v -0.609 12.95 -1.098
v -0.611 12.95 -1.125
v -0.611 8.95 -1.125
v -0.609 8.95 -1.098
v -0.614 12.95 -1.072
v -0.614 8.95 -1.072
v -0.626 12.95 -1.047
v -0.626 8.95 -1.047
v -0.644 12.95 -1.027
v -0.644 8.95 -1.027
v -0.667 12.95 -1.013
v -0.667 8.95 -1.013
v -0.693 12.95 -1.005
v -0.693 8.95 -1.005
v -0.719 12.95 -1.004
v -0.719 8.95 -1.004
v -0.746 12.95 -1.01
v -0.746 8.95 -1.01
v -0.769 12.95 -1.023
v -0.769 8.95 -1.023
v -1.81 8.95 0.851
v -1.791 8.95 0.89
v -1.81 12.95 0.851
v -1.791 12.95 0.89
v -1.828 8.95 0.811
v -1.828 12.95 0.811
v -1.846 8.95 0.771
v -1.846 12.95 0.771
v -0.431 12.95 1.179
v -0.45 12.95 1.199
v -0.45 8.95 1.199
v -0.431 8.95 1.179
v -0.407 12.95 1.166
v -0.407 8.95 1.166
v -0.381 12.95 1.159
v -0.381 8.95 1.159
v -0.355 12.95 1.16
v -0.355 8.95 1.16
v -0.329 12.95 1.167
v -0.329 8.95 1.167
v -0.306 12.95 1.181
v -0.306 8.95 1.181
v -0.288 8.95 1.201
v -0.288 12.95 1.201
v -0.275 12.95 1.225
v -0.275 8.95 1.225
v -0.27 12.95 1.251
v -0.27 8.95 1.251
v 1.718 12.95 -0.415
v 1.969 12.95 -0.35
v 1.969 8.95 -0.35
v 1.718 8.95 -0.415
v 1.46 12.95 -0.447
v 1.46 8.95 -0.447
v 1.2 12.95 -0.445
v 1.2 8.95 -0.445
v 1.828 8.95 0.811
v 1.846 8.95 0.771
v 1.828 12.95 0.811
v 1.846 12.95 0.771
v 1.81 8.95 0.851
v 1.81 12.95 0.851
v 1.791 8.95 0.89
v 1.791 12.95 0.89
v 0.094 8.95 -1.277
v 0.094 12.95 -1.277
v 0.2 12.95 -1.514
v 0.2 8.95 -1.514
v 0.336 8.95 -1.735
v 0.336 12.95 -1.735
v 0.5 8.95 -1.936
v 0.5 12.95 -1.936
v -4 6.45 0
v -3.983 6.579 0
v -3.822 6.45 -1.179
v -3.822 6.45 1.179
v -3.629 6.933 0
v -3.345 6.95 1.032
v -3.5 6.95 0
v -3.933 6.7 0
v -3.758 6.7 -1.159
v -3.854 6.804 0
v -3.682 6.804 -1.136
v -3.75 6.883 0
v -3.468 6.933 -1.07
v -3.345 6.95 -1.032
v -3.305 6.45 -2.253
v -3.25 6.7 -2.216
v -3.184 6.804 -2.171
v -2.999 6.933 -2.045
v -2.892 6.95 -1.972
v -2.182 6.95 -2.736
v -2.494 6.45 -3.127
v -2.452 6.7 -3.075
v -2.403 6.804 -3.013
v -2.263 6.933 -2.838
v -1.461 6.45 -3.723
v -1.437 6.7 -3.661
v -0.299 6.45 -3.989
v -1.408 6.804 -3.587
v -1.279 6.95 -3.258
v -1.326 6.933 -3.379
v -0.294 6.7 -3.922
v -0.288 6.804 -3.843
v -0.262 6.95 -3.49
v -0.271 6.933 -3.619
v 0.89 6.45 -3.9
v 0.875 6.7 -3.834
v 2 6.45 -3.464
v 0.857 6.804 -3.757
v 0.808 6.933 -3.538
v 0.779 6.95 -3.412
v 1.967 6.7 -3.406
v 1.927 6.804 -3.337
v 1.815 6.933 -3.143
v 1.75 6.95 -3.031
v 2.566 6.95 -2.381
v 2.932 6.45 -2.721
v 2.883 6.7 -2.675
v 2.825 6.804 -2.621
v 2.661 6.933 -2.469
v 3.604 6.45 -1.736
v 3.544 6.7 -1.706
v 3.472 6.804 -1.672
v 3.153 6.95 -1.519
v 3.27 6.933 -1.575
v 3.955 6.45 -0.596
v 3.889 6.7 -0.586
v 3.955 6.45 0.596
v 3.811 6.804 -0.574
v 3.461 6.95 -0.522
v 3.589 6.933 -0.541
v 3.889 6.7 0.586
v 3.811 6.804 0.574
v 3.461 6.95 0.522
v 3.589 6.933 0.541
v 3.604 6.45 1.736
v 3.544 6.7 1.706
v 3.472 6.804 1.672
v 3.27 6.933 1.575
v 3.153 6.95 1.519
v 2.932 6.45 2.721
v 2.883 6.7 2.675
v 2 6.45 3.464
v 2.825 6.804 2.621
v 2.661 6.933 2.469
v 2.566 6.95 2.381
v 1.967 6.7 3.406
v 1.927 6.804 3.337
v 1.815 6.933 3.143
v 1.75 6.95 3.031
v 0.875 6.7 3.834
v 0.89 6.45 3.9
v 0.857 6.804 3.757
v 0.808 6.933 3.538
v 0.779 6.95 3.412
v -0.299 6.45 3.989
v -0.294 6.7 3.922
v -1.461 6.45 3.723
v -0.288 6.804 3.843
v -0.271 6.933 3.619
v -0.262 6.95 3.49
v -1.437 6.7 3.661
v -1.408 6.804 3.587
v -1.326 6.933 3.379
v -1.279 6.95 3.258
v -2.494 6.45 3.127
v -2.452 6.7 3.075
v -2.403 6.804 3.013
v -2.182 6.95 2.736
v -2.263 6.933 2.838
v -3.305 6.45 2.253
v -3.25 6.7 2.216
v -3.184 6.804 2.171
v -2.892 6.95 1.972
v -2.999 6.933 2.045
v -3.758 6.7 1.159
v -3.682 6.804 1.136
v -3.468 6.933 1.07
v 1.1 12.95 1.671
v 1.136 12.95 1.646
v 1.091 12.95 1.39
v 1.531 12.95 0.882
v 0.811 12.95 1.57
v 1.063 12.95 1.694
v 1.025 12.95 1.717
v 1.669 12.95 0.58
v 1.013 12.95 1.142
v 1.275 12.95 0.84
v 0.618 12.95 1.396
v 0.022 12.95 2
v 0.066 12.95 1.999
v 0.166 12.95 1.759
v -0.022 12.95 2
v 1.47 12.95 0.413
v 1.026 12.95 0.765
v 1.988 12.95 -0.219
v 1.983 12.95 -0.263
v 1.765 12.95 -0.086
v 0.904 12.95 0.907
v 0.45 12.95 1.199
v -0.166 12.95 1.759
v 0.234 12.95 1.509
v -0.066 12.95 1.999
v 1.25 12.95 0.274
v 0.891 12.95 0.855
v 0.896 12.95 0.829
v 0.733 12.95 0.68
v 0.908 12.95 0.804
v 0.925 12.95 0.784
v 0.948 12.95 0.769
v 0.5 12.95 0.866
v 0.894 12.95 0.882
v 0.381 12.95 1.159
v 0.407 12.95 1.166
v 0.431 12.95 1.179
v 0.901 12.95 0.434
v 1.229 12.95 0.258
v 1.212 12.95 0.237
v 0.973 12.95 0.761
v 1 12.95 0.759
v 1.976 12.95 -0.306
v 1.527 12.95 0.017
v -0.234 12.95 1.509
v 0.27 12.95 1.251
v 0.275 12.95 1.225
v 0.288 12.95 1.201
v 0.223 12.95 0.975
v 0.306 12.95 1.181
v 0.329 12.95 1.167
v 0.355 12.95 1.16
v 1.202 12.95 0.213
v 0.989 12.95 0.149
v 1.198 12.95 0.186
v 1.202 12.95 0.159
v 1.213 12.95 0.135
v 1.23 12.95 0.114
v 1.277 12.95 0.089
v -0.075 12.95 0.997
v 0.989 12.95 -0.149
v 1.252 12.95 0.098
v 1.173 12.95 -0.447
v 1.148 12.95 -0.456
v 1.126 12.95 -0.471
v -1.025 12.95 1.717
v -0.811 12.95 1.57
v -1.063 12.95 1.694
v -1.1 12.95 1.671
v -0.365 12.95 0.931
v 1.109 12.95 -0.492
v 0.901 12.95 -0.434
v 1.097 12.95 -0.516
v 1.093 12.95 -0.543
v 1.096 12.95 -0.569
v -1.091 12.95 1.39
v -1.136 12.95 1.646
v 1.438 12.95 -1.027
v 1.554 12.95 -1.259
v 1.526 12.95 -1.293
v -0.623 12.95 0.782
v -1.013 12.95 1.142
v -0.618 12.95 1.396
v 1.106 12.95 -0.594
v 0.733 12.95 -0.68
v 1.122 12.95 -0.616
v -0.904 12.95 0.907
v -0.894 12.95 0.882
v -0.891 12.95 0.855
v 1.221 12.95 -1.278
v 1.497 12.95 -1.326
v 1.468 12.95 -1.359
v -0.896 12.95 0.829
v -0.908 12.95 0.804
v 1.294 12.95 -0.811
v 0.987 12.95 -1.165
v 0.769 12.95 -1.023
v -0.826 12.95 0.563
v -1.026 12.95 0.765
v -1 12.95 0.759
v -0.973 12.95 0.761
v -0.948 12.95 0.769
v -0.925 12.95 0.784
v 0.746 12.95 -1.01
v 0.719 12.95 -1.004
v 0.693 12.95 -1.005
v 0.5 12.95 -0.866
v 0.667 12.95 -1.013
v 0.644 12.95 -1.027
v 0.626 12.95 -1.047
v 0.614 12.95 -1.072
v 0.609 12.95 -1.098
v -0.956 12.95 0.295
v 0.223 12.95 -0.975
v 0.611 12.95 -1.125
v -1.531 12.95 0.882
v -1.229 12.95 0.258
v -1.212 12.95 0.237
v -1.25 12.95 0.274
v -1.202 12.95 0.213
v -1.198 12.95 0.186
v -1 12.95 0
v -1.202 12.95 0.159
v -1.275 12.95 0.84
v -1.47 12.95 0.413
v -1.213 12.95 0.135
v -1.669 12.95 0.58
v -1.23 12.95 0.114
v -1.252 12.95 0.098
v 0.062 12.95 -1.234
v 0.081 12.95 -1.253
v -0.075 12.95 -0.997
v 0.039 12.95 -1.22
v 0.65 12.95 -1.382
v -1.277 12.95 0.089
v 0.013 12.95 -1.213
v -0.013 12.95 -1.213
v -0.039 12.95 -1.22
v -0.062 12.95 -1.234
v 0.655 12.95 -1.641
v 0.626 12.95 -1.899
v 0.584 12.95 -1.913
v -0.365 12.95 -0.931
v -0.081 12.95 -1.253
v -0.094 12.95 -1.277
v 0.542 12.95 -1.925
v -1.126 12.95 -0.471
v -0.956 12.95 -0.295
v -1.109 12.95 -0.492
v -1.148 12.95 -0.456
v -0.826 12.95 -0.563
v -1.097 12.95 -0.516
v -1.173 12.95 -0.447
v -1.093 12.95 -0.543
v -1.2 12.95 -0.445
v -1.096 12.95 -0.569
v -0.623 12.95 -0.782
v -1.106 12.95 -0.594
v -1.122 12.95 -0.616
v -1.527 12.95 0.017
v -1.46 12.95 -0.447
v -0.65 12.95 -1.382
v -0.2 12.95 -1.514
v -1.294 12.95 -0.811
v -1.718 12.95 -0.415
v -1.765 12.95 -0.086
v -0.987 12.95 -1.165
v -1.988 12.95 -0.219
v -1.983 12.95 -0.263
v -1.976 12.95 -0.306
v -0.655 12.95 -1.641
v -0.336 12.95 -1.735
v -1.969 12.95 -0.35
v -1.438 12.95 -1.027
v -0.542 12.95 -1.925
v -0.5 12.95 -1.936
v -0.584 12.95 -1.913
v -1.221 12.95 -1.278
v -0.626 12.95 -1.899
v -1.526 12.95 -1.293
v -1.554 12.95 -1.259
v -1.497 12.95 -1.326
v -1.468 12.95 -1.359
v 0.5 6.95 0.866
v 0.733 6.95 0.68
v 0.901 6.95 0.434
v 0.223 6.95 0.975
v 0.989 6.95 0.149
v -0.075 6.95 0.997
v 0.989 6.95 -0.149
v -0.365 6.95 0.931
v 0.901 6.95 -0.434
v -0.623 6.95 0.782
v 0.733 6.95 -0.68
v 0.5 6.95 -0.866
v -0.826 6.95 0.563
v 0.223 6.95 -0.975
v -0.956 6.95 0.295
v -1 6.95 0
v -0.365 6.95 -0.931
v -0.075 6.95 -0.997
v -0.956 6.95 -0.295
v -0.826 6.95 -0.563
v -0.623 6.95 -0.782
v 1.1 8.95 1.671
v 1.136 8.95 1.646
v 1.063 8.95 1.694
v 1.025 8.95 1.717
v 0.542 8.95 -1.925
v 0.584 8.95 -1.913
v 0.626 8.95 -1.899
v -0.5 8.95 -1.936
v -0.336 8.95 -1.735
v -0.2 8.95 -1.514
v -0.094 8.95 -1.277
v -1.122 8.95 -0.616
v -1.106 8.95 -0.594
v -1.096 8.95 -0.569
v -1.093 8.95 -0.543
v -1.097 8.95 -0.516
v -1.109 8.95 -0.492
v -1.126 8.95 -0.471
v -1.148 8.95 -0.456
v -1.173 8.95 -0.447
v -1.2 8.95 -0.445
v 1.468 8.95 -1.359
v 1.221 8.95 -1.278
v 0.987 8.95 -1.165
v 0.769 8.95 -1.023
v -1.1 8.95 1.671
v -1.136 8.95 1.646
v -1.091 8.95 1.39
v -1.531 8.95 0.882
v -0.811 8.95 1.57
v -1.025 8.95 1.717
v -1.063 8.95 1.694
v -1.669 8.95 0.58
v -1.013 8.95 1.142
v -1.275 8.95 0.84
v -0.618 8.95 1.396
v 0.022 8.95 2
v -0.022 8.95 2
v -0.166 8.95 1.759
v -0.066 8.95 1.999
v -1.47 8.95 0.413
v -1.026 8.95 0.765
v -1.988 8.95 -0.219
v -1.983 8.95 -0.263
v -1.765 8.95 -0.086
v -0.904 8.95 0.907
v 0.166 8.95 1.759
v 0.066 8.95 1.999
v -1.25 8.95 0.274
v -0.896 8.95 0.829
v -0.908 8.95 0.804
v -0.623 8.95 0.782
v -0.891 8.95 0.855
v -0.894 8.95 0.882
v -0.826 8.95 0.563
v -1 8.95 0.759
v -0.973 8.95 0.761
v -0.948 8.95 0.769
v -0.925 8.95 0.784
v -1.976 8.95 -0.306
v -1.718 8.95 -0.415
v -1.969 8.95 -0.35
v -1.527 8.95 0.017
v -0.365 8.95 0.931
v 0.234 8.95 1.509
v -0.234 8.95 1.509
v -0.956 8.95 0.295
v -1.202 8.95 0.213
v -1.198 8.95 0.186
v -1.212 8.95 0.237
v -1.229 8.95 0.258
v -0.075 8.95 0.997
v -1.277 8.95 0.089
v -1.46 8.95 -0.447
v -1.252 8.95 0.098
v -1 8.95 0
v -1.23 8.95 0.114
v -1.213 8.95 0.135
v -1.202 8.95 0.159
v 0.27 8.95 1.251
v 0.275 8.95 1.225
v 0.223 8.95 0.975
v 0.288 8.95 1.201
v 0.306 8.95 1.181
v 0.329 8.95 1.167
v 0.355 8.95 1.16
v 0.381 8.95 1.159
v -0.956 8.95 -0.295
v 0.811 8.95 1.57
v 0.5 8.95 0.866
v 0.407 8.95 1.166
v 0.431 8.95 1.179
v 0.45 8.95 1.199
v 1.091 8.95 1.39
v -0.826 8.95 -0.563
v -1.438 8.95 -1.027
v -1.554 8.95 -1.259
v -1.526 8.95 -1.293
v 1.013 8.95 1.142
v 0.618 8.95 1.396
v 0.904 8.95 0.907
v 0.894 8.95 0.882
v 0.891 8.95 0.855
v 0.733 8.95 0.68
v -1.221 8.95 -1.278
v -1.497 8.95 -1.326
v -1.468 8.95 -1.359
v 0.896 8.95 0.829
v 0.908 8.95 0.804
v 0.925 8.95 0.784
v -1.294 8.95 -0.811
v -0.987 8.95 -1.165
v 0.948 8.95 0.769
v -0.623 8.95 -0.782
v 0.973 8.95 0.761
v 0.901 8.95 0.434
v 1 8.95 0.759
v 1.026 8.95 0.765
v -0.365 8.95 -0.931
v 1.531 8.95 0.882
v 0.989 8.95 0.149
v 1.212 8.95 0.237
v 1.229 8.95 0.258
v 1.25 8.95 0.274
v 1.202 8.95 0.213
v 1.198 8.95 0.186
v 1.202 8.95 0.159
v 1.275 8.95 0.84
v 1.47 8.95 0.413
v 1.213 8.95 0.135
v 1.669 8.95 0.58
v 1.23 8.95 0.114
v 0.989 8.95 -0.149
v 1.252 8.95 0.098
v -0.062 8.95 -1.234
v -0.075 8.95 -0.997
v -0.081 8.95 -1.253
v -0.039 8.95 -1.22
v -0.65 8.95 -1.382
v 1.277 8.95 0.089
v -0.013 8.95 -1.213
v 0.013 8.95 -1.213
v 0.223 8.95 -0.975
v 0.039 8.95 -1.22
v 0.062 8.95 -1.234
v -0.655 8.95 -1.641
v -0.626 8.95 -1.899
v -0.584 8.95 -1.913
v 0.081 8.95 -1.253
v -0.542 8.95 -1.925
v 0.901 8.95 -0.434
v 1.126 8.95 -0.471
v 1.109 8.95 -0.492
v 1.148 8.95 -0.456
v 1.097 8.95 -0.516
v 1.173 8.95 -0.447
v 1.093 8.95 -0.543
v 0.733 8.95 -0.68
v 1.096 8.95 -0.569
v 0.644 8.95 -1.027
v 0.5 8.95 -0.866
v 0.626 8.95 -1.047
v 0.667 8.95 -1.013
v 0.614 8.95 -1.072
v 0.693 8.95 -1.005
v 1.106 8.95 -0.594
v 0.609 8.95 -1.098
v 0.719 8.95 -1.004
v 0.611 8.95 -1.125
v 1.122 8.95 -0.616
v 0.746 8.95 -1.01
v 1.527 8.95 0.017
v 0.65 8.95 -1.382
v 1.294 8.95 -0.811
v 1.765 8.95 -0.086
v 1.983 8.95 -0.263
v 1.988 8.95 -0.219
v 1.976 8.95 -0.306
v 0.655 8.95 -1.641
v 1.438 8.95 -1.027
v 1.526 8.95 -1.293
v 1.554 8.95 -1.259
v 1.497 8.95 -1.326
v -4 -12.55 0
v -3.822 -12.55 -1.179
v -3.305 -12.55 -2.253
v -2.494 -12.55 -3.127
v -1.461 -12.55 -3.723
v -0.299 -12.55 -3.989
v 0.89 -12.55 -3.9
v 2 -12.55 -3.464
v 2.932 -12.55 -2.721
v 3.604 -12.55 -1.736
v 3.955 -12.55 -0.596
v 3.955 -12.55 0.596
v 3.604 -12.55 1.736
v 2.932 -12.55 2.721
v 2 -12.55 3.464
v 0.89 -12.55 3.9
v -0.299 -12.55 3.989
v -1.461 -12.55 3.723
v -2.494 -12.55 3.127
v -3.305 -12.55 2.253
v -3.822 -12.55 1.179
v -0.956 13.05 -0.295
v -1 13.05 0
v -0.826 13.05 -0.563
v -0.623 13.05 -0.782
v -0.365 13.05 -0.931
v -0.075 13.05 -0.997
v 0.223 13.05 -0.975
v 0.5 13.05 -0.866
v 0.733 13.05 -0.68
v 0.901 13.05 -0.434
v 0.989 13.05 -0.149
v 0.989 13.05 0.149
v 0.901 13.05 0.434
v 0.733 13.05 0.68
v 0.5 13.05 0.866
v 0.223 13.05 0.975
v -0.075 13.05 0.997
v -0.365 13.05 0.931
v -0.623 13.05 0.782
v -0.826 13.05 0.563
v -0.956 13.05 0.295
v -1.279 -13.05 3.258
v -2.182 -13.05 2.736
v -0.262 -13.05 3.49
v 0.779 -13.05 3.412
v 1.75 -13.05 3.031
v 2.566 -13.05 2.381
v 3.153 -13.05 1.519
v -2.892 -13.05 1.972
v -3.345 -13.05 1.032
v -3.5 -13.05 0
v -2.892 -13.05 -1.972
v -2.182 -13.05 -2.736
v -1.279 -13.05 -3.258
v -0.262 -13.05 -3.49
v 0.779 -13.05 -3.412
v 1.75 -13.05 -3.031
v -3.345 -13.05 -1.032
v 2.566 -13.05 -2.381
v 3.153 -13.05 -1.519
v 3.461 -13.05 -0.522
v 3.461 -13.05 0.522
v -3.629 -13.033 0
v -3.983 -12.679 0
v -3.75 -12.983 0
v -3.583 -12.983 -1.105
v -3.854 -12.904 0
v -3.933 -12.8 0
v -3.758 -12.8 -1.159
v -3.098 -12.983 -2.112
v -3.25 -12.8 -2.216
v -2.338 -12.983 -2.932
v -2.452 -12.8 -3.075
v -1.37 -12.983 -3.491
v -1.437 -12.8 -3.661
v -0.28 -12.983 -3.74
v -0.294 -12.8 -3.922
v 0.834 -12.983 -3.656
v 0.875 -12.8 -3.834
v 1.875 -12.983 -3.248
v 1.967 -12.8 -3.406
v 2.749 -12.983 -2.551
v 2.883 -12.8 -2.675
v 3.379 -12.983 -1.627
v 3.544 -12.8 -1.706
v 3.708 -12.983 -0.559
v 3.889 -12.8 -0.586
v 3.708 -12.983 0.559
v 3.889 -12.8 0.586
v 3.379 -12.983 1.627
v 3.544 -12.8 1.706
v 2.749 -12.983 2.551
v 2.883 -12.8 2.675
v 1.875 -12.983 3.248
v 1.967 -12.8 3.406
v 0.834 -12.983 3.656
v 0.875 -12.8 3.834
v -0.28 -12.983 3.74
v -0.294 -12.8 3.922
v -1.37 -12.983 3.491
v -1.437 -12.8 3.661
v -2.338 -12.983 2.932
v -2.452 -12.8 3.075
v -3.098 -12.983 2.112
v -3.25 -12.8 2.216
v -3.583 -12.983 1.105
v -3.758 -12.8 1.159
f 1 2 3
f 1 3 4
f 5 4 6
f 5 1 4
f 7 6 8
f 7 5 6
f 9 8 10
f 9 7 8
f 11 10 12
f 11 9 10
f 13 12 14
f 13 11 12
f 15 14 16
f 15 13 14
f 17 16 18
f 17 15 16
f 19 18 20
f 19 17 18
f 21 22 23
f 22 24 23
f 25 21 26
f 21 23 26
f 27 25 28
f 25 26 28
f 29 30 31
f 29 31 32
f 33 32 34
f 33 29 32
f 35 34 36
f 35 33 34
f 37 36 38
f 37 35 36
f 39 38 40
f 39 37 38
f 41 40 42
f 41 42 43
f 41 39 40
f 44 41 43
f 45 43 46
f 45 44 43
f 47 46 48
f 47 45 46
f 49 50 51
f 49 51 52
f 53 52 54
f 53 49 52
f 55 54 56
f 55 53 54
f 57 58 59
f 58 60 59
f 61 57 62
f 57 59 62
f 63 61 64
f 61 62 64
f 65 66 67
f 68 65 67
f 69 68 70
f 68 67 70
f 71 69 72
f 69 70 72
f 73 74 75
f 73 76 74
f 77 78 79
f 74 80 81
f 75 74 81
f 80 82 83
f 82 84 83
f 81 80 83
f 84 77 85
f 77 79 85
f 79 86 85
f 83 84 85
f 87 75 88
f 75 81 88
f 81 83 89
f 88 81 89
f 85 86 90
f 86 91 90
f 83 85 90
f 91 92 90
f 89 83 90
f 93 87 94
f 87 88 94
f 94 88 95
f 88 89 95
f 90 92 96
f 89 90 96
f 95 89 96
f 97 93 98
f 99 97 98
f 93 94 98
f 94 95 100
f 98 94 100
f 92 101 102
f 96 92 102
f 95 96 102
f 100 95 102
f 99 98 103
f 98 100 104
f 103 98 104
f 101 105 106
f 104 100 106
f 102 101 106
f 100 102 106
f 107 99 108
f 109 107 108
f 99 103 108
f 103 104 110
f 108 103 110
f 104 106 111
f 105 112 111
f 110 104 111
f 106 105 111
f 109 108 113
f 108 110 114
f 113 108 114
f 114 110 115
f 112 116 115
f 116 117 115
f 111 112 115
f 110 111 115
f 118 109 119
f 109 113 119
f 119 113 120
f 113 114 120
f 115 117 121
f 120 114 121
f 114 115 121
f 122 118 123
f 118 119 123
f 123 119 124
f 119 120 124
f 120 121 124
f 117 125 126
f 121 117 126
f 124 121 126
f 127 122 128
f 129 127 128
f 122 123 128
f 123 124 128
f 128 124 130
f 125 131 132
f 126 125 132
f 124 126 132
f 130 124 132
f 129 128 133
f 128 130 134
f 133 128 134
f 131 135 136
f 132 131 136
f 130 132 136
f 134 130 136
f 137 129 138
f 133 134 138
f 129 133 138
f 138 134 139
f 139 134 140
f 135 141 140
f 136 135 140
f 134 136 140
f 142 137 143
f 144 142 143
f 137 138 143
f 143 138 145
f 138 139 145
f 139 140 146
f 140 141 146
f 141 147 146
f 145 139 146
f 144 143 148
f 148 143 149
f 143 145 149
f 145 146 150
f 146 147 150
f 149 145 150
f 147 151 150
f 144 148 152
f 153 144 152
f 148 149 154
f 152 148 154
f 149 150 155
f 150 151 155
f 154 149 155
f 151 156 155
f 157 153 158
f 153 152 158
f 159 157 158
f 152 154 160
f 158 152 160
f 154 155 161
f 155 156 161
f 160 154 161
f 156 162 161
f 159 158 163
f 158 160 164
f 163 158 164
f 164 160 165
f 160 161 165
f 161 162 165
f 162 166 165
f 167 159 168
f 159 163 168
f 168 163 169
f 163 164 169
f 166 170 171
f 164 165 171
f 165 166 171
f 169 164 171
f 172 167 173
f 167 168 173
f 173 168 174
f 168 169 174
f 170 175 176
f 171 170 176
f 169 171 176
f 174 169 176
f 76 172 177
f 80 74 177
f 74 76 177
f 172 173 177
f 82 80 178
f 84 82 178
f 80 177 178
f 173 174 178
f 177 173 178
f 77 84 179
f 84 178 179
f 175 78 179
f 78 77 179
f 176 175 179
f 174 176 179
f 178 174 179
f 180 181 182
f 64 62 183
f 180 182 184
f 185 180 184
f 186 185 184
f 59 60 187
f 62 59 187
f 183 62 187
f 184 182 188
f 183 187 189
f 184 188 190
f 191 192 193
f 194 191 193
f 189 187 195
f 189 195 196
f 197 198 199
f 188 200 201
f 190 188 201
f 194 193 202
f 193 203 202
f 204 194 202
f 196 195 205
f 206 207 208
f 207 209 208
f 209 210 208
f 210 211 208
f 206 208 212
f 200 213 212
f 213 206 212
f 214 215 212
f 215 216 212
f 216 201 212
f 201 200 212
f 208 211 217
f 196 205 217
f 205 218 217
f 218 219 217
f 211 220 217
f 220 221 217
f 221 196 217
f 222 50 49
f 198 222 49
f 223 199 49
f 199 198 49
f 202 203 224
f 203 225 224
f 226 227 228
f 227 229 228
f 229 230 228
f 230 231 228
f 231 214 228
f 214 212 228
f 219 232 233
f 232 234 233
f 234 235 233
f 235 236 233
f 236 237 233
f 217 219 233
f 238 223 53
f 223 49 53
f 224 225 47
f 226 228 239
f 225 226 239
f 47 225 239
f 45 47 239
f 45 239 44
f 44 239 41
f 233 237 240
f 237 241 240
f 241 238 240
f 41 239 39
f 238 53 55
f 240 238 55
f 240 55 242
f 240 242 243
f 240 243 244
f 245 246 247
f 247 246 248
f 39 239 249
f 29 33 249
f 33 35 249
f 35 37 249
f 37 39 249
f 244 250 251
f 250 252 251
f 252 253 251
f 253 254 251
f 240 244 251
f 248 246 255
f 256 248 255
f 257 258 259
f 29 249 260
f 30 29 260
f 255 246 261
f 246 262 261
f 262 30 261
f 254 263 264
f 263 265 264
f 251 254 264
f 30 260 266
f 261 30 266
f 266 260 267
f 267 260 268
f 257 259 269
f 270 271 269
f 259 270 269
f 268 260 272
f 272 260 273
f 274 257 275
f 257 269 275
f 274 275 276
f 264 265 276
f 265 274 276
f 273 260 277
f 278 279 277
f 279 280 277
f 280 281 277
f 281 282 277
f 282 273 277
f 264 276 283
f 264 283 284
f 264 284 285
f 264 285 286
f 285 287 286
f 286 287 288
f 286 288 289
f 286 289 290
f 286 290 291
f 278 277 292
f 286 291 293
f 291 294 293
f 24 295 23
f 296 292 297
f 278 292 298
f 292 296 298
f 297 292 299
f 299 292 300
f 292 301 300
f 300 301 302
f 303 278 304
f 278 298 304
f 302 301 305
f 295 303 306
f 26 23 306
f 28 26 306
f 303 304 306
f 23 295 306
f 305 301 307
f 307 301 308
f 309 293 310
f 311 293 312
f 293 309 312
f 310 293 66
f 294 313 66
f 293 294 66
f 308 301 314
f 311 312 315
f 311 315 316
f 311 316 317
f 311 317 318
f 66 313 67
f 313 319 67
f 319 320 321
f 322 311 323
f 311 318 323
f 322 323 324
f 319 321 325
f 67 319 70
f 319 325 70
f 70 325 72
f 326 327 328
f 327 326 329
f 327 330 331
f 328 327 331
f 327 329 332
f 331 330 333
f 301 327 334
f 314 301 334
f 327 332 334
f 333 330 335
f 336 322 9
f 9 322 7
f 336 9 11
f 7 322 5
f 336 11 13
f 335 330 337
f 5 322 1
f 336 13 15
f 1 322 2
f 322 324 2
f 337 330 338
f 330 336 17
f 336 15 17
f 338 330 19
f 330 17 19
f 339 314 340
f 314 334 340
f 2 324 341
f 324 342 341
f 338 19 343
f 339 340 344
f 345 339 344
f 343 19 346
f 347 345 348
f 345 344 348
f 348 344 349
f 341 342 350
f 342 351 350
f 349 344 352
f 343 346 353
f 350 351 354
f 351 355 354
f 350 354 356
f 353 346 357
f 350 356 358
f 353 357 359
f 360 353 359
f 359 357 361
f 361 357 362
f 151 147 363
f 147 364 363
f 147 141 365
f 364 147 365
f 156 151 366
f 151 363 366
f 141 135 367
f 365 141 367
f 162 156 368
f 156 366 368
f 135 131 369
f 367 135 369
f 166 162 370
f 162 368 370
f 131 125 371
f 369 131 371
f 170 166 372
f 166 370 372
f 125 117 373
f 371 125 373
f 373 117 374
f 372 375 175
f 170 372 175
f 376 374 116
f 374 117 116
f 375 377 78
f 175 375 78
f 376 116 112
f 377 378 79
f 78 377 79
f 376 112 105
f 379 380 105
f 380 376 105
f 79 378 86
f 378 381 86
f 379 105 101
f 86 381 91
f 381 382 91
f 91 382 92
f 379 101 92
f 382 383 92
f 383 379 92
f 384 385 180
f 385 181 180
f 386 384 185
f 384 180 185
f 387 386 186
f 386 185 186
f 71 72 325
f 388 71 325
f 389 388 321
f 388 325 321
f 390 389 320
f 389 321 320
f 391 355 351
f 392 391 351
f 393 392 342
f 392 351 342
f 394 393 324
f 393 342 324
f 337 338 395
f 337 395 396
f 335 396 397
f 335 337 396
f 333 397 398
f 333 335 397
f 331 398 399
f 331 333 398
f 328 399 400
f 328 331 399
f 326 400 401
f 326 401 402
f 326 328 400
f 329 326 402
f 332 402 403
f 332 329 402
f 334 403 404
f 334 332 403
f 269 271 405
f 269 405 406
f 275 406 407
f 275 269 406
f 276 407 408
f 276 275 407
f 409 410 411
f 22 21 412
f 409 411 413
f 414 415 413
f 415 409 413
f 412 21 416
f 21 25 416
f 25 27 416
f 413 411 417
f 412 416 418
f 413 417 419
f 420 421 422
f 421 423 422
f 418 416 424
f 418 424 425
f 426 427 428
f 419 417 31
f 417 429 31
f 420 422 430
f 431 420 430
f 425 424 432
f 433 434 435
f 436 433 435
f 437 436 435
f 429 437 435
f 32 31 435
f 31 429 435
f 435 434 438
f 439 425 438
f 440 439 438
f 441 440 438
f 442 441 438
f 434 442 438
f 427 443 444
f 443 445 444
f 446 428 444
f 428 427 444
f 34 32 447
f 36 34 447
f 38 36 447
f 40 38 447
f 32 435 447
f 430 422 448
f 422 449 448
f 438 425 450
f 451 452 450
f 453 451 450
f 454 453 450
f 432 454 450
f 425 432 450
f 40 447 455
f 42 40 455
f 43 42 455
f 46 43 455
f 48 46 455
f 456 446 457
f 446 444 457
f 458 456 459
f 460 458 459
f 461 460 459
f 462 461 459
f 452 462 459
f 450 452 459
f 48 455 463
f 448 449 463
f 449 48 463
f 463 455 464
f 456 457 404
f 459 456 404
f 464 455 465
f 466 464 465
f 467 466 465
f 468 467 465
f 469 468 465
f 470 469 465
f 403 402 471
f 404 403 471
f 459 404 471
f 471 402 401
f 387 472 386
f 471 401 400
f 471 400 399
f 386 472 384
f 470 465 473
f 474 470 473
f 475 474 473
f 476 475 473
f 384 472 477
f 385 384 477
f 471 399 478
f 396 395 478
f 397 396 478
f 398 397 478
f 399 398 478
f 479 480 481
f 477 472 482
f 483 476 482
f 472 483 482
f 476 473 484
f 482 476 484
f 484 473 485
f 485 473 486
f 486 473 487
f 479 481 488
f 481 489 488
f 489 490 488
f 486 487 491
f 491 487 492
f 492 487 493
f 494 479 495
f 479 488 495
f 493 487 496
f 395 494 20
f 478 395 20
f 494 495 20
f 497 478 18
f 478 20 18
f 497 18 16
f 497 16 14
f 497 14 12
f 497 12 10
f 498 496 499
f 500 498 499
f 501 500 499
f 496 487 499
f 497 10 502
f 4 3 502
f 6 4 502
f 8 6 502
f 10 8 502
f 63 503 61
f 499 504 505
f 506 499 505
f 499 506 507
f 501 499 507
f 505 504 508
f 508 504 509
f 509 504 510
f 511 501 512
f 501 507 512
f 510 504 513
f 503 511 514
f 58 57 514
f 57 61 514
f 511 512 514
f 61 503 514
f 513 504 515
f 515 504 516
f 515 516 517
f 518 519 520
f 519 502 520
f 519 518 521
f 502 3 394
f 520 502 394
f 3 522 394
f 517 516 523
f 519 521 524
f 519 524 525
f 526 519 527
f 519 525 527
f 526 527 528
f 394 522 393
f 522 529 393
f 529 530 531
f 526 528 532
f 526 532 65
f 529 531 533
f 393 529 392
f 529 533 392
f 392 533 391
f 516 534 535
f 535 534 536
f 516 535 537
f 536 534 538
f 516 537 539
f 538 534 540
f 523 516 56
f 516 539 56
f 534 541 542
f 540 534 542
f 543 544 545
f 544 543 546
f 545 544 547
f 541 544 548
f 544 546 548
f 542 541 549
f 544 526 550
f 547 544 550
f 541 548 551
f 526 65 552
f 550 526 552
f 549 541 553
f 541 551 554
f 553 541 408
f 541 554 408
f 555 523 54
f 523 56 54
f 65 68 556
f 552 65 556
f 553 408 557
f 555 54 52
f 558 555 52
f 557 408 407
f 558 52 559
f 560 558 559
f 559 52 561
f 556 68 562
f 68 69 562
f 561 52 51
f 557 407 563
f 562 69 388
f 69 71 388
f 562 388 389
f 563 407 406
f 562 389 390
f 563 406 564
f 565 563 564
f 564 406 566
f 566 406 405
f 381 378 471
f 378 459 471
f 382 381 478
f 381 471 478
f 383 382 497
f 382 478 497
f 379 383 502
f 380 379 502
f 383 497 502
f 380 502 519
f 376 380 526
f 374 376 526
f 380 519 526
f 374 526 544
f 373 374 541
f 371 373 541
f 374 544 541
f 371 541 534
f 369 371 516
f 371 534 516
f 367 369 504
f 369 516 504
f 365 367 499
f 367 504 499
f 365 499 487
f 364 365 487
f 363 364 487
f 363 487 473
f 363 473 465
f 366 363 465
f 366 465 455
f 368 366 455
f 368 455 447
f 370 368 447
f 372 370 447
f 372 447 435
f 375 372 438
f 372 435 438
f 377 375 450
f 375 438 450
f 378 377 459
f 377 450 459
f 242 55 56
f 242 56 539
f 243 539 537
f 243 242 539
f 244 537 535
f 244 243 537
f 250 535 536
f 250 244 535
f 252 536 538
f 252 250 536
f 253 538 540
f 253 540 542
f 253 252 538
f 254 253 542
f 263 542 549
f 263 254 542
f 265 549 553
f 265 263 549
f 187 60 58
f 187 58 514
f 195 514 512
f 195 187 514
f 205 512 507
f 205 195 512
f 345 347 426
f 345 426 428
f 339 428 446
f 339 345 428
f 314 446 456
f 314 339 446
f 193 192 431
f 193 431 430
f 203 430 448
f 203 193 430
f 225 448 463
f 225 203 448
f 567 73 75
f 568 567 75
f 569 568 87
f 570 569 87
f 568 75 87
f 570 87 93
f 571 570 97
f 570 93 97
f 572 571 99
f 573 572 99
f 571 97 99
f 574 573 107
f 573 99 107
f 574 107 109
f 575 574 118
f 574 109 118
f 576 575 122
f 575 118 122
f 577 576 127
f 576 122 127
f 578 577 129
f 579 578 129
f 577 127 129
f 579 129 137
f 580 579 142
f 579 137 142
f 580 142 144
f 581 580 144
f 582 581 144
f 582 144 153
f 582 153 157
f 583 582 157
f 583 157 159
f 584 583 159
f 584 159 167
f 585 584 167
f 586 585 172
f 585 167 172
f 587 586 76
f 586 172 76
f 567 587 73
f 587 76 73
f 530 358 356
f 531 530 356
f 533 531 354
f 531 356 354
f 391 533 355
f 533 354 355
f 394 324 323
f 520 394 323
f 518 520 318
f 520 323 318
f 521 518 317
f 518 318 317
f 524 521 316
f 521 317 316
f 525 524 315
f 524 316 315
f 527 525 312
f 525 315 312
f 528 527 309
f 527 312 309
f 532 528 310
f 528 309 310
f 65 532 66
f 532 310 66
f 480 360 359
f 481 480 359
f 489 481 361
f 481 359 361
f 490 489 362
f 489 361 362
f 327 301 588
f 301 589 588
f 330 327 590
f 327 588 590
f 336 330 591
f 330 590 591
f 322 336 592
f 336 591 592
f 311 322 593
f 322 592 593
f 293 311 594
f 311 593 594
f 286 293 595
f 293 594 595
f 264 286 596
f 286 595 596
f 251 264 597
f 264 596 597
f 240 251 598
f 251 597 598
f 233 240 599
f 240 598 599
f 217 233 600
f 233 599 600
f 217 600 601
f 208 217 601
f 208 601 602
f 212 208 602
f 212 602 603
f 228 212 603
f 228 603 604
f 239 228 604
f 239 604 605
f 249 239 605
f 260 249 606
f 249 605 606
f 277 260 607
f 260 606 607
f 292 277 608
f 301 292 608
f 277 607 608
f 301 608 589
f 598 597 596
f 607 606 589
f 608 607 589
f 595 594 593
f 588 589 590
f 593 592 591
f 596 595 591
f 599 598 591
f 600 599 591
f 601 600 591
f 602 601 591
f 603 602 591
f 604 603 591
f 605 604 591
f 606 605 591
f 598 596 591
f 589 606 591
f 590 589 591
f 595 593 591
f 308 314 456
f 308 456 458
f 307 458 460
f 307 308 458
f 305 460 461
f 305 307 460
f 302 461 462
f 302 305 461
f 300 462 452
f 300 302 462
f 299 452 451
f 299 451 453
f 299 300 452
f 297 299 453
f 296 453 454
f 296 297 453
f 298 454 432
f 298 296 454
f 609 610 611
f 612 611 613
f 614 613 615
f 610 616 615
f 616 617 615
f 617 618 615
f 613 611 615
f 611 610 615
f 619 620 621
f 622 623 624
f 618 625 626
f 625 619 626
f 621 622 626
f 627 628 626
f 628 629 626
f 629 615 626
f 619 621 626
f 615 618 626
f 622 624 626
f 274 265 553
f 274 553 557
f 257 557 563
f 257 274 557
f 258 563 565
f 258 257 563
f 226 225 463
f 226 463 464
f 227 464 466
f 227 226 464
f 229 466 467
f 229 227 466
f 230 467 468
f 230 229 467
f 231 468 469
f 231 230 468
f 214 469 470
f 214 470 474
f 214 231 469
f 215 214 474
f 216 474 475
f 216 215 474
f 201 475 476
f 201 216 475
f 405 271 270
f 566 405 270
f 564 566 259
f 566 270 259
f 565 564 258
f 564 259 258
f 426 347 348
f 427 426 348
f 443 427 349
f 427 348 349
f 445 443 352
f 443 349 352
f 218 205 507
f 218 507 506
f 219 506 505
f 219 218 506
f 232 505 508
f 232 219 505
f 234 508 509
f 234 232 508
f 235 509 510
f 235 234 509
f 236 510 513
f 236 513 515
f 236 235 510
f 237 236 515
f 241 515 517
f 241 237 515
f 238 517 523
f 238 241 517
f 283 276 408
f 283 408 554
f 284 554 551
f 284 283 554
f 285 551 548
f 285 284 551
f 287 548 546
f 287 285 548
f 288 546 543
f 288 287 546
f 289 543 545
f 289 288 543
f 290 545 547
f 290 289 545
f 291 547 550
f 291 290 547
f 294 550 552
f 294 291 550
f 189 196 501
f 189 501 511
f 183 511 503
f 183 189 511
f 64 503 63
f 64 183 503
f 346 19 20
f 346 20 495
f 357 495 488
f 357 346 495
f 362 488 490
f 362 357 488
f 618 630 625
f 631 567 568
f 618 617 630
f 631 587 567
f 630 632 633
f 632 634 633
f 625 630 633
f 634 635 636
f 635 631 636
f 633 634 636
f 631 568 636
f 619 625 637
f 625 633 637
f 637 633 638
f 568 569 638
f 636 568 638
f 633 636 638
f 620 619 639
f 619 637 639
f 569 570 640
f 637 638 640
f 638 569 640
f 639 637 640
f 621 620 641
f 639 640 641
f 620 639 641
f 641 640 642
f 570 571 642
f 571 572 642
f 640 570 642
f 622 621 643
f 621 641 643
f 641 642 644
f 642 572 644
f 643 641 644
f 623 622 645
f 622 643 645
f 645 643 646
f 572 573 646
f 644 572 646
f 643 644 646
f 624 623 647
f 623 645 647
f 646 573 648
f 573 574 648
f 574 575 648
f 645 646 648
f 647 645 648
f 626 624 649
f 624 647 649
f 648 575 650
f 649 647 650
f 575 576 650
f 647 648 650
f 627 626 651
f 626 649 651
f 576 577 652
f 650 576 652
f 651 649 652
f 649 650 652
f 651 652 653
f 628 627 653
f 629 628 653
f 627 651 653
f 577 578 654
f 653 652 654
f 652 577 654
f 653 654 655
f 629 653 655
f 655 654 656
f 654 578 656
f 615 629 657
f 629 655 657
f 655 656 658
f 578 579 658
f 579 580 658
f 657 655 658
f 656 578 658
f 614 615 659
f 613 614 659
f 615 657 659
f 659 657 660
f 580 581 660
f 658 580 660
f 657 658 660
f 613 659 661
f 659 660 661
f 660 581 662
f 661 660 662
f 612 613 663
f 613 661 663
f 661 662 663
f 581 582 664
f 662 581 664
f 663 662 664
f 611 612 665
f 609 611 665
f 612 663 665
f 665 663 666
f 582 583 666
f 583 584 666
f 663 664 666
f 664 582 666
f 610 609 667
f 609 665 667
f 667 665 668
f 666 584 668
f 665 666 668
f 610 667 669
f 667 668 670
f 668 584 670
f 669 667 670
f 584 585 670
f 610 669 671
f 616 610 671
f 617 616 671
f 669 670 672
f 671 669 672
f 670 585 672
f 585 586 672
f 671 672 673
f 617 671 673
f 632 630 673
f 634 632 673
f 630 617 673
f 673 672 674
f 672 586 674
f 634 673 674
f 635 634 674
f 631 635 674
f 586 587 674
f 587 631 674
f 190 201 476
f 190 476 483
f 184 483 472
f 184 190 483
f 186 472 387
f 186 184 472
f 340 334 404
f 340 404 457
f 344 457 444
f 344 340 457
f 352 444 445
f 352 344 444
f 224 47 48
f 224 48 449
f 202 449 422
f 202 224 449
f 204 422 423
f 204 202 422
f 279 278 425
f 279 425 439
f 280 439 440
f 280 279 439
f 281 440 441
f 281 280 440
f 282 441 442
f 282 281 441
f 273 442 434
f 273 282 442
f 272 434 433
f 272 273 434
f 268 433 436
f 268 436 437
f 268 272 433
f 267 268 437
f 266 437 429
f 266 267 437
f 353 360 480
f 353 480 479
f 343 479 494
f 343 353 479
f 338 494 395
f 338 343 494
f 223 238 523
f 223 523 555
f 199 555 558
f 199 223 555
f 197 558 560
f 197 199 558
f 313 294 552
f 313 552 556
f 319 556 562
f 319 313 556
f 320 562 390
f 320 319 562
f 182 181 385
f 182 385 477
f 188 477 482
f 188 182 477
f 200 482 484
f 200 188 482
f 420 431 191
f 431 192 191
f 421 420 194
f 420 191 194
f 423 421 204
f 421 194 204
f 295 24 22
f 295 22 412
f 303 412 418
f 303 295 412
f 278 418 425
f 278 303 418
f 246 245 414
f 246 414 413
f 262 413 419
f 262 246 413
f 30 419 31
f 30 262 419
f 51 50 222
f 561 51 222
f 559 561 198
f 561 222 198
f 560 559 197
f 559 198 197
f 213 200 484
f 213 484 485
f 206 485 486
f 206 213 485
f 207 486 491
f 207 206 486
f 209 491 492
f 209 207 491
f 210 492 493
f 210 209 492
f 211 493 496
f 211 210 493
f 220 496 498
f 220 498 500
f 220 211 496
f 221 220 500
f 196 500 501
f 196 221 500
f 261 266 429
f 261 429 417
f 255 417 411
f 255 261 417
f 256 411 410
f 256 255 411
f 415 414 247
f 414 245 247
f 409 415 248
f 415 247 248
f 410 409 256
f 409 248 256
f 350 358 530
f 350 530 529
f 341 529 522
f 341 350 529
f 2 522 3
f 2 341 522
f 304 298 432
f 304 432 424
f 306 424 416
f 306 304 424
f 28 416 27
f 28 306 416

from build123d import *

# Parameters (mm, degrees)
CUT_EXTRUDE1_DEPTH = 4
FILLET1_R          = 0.5


with BuildPart() as part:
    # Sketch1 → Revolve1 (revolve)
    with BuildSketch(Plane.XY, mode=Mode.PRIVATE) as revolve1_sk:
        Polygon((0, 13.05), (0, -13.05), (4, -13.05), (4, 6.95), (1, 6.95), (1, 8.95), (2, 8.95), (2, 12.95), (1, 12.95), (1, 13.05), align=None)
    revolve(revolve1_sk.sketch.rotate(Axis((0, 13.05, 0), (0, -1, 0)), 180), axis=Axis((0, 13.05, 0), (0, -1, 0)))

    # Sketch2 → Cut-Extrude1 (cut)
    with BuildSketch(Plane(origin=(0, 12.95, 0), x_dir=(1, 0, 0), z_dir=(0, 1, 0))):
        with BuildLine():
            ThreePointArc((0.5, 1.936491673), (0, 2), (-0.5, 1.936491673))
            ThreePointArc((-0.5, 1.936491673), (-0.264591418, 1.626479536), (-0.093693162, 1.276738901))
            ThreePointArc((-0.093693162, 1.276738901), (0, 1.211690173), (0.093693162, 1.276738901))
            ThreePointArc((0.093693162, 1.276738901), (0.264591418, 1.626479536), (0.5, 1.936491673))
        make_face()
        with BuildLine():
            ThreePointArc((1.467573208, 1.358760053), (1.101929691, 1.225232735), (0.769076867, 1.023406763))
            ThreePointArc((0.769076867, 1.023406763), (0.655089165, 1.019338638), (0.61143746, 1.124715459))
            ThreePointArc((0.61143746, 1.124715459), (0.65675276, 1.511330576), (0.626319675, 1.89940087))
            ThreePointArc((0.626319675, 1.89940087), (1.081281635, 1.682507066), (1.467573208, 1.358760053))
        make_face()
        with BuildLine():
            ThreePointArc((1.969202291, 0.349631716), (1.589413073, 0.434983198), (1.2002841, 0.445150209))
            ThreePointArc((1.2002841, 0.445150209), (1.102192149, 0.503354289), (1.122441008, 0.615602805))
            ThreePointArc((1.122441008, 0.615602805), (1.369582578, 0.916344837), (1.553787278, 1.259263711))
            ThreePointArc((1.553787278, 1.259263711), (1.819263991, 0.830830026), (1.969202291, 0.349631716))
        make_face()
        with BuildLine():
            ThreePointArc((1.845623561, -0.77050222), (1.572269034, -0.493370431), (1.250409613, -0.274438391))
            ThreePointArc((1.250409613, -0.274438391), (1.199356914, -0.172441491), (1.277077467, -0.088959389))
            ThreePointArc((1.277077467, -0.088959389), (1.647579604, 0.030426087), (1.987938399, 0.219319222))
            ThreePointArc((1.987938399, 0.219319222), (1.979642884, -0.284629677), (1.845623561, -0.77050222))
        make_face()
        with BuildLine():
            ThreePointArc((1.136072391, -1.646007146), (1.055940687, -1.265082434), (0.903538908, -0.906894741))
            ThreePointArc((0.903538908, -0.906894741), (0.915734332, -0.793488316), (1.026250854, -0.765277606))
            ThreePointArc((1.026250854, -0.765277606), (1.402481747, -0.865152731), (1.790933125, -0.890257571))
            ThreePointArc((1.790933125, -0.890257571), (1.511499149, -1.309721468), (1.136072391, -1.646007146))
        make_face()
        with BuildLine():
            ThreePointArc((0.065826264, -1.998916432), (0.204358632, -1.635139703), (0.269800984, -1.251418419))
            ThreePointArc((0.269800984, -1.251418419), (0.34137257, -1.162608207), (0.449596846, -1.198625591))
            ThreePointArc((0.449596846, -1.198625591), (0.712105845, -1.48605167), (1.025319237, -1.717183875))
            ThreePointArc((1.025319237, -1.717183875), (0.563465114, -1.918985947), (0.065826264, -1.998916432))
        make_face()
        with BuildLine():
            ThreePointArc((-1.025319237, -1.717183875), (-0.712105845, -1.48605167), (-0.449596846, -1.198625591))
            ThreePointArc((-0.449596846, -1.198625591), (-0.34137257, -1.162608207), (-0.269800984, -1.251418419))
            ThreePointArc((-0.269800984, -1.251418419), (-0.204358632, -1.635139703), (-0.065826264, -1.998916432))
            ThreePointArc((-0.065826264, -1.998916432), (-0.563465114, -1.918985947), (-1.025319237, -1.717183875))
        make_face()
        with BuildLine():
            ThreePointArc((-1.790933125, -0.890257571), (-1.402481747, -0.865152731), (-1.026250854, -0.765277606))
            ThreePointArc((-1.026250854, -0.765277606), (-0.915734332, -0.793488316), (-0.903538908, -0.906894741))
            ThreePointArc((-0.903538908, -0.906894741), (-1.055940687, -1.265082434), (-1.136072391, -1.646007146))
            ThreePointArc((-1.136072391, -1.646007146), (-1.511499149, -1.309721468), (-1.790933125, -0.890257571))
        make_face()
        with BuildLine():
            ThreePointArc((-1.987938399, 0.219319222), (-1.647579604, 0.030426087), (-1.277077467, -0.088959389))
            ThreePointArc((-1.277077467, -0.088959389), (-1.199356914, -0.172441491), (-1.250409613, -0.274438391))
            ThreePointArc((-1.250409613, -0.274438391), (-1.572269034, -0.493370431), (-1.845623561, -0.77050222))
            ThreePointArc((-1.845623561, -0.77050222), (-1.979642884, -0.284629677), (-1.987938399, 0.219319222))
        make_face()
        with BuildLine():
            ThreePointArc((-1.553787278, 1.259263711), (-1.369582578, 0.916344837), (-1.122441008, 0.615602805))
            ThreePointArc((-1.122441008, 0.615602805), (-1.102192149, 0.503354289), (-1.2002841, 0.445150209))
            ThreePointArc((-1.2002841, 0.445150209), (-1.589413073, 0.434983198), (-1.969202291, 0.349631716))
            ThreePointArc((-1.969202291, 0.349631716), (-1.819263991, 0.830830026), (-1.553787278, 1.259263711))
        make_face()
        with BuildLine():
            ThreePointArc((-0.626319675, 1.89940087), (-0.65675276, 1.511330576), (-0.61143746, 1.124715459))
            ThreePointArc((-0.61143746, 1.124715459), (-0.655089165, 1.019338638), (-0.769076867, 1.023406763))
            ThreePointArc((-0.769076867, 1.023406763), (-1.101929691, 1.225232735), (-1.467573208, 1.358760053))
            ThreePointArc((-1.467573208, 1.358760053), (-1.081281635, 1.682507066), (-0.626319675, 1.89940087))
        make_face()
    extrude(amount=-CUT_EXTRUDE1_DEPTH, mode=Mode.SUBTRACT)

    # Fillet1
    fillet1_edges = [part.edges().sort_by_distance(p)[0] for p in [
        (4, -13.05, 0),
        (4, 6.95, 0),
    ]]
    fillet(fillet1_edges, radius=FILLET1_R)


solid = part.part
